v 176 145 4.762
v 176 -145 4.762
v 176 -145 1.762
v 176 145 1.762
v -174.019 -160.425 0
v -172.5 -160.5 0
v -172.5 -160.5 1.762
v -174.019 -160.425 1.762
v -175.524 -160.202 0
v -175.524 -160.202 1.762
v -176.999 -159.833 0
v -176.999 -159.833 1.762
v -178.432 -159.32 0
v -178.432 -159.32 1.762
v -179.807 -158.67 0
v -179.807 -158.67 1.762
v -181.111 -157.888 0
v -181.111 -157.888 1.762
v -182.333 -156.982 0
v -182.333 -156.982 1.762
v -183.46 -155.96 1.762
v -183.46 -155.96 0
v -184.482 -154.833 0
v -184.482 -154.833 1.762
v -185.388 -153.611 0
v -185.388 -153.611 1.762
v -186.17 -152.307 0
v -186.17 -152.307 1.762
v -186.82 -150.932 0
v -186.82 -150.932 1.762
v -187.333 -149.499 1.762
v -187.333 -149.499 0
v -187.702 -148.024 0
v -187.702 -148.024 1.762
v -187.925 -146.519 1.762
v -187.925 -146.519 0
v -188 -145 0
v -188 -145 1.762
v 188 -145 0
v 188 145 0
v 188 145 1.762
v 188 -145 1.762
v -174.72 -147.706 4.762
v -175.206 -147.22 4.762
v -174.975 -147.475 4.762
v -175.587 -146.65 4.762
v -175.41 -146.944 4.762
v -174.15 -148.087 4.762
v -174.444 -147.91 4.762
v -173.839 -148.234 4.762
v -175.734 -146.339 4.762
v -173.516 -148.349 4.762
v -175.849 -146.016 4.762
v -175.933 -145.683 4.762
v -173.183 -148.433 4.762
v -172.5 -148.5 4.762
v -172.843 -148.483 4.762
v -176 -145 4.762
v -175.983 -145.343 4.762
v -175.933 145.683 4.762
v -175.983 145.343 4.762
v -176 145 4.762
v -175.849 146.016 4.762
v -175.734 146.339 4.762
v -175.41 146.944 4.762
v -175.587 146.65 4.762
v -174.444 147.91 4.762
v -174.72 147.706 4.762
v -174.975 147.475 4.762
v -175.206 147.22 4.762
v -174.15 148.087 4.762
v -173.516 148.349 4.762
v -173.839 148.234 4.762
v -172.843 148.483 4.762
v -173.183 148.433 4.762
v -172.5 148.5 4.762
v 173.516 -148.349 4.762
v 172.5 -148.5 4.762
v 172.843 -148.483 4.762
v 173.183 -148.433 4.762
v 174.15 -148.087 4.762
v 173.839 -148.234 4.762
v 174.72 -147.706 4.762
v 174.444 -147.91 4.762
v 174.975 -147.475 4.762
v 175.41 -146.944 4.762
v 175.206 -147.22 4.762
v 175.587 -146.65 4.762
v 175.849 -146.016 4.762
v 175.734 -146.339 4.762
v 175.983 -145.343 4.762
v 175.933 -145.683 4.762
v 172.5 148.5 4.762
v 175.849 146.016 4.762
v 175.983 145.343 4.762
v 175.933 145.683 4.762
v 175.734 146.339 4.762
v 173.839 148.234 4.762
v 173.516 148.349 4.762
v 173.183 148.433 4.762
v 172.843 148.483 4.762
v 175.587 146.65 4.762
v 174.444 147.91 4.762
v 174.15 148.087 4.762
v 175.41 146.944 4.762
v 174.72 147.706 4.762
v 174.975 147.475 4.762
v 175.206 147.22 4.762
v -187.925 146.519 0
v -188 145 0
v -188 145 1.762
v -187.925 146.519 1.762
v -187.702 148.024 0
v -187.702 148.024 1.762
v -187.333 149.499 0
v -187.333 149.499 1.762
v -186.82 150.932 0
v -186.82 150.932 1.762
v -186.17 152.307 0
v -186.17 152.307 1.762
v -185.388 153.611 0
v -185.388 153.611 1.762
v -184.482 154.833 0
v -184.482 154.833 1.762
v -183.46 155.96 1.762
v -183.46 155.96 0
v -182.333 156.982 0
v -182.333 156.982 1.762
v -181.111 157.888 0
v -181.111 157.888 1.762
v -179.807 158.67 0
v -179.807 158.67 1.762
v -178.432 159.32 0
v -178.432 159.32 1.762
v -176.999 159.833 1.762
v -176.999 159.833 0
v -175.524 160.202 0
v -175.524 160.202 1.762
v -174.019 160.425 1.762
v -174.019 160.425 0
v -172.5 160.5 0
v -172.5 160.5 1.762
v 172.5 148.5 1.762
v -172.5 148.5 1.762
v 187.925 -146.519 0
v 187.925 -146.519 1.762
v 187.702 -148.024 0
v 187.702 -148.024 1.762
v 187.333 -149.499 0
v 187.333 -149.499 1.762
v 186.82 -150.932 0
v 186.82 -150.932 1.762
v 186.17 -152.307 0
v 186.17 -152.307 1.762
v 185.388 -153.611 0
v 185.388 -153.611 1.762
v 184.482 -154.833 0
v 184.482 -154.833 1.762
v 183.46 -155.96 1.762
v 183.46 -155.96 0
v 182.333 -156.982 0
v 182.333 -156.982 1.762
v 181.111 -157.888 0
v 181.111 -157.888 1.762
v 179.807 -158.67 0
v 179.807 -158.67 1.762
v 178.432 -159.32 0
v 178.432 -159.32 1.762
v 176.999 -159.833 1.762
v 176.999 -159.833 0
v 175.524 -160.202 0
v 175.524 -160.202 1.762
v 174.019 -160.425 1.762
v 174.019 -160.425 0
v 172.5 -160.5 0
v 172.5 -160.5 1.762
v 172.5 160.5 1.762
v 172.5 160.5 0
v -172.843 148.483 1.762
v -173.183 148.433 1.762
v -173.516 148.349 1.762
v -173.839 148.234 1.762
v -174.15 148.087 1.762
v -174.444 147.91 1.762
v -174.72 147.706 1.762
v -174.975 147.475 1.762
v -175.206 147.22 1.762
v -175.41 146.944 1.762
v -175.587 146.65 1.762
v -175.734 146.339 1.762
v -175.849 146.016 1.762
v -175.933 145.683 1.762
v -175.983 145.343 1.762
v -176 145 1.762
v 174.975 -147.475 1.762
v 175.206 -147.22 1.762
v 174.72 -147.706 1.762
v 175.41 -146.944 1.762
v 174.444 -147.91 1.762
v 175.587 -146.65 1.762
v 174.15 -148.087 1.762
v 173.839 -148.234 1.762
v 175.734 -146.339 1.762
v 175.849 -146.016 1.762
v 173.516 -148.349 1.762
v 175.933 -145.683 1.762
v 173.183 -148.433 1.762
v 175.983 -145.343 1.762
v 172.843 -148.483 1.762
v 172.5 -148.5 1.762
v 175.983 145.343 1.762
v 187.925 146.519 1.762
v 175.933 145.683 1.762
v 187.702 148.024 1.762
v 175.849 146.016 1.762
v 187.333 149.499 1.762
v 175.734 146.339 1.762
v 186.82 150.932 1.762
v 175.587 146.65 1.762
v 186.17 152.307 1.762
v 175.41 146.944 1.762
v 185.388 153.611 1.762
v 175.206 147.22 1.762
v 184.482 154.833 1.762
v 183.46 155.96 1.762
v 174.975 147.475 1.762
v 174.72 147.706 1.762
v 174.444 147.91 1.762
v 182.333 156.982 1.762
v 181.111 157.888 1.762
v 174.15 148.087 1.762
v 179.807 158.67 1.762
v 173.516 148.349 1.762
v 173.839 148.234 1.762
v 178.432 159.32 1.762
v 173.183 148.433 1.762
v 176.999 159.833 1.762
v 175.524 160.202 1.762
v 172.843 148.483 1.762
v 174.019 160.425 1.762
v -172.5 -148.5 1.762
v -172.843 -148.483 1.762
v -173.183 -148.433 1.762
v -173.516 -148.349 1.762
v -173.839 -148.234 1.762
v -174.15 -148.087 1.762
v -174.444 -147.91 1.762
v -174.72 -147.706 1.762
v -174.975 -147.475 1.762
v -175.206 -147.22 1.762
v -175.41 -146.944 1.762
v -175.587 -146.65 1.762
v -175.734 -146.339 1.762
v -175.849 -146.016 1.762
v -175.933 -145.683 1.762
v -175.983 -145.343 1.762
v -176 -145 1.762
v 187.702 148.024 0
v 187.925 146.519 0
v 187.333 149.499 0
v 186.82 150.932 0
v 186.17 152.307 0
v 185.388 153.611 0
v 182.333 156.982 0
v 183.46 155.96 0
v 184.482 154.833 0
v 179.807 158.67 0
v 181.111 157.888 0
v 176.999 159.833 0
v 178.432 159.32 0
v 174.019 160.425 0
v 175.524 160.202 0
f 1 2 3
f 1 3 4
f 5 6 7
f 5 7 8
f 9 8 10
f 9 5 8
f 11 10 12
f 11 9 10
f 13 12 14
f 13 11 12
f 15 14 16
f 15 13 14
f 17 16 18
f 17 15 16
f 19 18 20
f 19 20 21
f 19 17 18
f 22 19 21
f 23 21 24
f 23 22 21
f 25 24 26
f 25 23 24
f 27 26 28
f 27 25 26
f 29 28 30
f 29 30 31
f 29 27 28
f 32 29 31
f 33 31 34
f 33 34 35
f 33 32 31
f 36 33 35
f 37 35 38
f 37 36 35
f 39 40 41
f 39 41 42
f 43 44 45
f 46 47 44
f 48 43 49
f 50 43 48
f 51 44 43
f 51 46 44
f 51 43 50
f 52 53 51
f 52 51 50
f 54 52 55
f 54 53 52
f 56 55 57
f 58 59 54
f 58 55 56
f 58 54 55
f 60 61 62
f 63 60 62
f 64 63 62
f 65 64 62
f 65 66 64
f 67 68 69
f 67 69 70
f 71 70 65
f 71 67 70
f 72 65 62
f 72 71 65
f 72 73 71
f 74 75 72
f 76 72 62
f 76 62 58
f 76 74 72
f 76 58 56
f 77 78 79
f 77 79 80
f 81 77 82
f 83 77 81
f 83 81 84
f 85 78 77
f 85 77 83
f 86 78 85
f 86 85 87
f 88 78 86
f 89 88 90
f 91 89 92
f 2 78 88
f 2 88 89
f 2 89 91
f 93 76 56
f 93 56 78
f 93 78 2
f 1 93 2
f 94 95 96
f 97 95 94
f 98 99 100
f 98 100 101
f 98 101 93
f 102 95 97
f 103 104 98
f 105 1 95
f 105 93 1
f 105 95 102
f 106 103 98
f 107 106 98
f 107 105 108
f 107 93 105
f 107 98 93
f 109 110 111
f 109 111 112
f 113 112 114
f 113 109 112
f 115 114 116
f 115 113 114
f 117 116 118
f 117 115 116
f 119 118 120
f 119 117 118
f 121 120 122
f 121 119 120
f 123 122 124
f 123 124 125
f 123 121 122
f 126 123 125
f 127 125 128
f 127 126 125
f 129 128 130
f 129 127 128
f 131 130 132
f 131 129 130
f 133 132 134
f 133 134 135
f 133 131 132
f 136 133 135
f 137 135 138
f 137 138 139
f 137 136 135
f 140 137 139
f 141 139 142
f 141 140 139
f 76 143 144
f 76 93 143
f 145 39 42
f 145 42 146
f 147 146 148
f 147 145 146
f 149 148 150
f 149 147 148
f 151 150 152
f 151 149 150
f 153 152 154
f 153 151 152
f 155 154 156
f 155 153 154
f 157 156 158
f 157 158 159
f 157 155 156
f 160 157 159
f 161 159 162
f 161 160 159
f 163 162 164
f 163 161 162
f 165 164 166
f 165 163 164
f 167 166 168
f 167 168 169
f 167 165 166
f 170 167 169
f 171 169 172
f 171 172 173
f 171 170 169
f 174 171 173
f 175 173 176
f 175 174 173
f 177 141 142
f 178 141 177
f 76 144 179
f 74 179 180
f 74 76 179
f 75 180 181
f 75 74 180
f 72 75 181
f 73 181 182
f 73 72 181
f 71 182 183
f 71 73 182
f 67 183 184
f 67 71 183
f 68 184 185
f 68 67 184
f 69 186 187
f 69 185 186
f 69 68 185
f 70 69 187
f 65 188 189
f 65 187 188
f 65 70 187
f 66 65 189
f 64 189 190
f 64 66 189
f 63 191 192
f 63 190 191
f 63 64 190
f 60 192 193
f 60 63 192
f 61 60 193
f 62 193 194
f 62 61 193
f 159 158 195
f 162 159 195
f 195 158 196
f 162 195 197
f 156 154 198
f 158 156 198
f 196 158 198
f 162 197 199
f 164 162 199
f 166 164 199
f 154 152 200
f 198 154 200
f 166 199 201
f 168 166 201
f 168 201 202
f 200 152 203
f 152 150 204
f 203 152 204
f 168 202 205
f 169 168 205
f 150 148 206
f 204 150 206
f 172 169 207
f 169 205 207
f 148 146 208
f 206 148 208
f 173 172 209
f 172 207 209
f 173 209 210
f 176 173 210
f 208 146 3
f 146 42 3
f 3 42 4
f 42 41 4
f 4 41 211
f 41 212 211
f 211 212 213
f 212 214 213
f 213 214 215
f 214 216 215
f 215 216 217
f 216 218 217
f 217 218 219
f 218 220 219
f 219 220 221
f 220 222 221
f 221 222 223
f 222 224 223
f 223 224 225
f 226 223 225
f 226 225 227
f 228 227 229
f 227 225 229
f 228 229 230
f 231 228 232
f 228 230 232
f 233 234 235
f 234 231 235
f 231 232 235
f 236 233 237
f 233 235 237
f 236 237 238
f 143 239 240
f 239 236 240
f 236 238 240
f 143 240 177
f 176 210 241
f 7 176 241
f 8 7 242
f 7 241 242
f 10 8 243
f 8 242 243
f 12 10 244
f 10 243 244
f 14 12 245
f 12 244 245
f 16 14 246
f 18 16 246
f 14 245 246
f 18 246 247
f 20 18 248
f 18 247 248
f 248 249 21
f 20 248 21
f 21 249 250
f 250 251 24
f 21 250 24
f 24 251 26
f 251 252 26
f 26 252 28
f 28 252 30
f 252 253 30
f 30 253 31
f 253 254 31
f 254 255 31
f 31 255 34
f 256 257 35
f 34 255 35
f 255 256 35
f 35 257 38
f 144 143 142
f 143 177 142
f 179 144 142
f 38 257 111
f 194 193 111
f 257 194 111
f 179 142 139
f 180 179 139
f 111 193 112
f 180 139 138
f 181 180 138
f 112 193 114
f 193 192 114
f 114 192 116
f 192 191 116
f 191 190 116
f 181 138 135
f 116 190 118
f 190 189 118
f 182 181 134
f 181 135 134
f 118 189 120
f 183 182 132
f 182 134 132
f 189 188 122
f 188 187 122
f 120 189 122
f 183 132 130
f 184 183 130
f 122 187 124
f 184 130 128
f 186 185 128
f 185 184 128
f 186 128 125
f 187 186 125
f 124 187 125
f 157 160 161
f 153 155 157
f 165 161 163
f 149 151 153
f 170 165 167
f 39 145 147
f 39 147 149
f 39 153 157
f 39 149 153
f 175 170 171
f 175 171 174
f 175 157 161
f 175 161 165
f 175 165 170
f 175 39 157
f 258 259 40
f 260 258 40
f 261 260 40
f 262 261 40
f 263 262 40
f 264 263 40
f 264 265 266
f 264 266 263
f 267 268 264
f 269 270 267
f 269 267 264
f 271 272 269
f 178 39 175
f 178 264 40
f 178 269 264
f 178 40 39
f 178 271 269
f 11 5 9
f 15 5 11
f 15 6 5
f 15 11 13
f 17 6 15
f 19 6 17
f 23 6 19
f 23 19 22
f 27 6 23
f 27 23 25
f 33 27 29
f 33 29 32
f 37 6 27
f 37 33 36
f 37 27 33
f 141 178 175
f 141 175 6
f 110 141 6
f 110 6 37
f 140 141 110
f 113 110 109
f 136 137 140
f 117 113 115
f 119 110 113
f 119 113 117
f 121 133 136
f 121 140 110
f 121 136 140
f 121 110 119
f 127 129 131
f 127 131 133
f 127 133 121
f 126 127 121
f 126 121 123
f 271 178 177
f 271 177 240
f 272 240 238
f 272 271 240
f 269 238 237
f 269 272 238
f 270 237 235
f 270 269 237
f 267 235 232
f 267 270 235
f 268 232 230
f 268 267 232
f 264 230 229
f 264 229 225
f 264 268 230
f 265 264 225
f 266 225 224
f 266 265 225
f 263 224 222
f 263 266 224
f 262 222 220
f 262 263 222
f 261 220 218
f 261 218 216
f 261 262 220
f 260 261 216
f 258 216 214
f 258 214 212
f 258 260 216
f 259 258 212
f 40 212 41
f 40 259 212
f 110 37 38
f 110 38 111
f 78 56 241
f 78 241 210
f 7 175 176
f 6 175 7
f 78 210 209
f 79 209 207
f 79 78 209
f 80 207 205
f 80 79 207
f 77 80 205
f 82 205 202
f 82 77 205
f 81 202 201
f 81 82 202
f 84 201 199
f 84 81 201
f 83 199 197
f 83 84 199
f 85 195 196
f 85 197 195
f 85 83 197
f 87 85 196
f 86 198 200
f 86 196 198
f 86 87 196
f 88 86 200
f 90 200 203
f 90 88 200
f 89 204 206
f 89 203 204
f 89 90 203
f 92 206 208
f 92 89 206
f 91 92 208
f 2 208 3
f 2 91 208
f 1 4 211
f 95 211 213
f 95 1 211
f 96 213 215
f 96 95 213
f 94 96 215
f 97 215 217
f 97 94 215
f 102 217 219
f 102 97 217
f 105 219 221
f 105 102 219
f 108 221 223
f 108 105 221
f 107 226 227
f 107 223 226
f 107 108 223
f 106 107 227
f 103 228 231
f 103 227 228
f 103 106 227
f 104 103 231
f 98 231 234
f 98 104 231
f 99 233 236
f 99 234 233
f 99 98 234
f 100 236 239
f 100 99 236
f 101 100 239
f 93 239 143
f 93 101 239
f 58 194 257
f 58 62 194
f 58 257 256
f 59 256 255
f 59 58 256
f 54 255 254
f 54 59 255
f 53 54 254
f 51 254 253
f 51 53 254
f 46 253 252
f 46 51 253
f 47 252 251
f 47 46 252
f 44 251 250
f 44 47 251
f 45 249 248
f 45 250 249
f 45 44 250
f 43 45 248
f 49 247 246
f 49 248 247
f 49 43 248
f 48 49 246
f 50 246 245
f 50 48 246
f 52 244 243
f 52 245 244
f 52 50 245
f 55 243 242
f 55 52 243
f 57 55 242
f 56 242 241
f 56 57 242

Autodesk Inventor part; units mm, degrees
ref_plane "YZ Plane" through (0, 0, 0) normal (1, 0, 0) x (0, 1, 0)
ref_plane "XZ Plane" through (0, 0, 0) normal (0, 1, 0) x (-1, 0, 0)
sketch "Sketch1" plane through (0, 0, 0) normal (0, 0, 1) x (1, 0, 0)
  line L0 (176.5, -149) -> (-176.5, -149)
  line L1 (-176.5, -149) -> (-176.5, 149)
  line L2 (-176.5, 149) -> (176.5, 149)
  line L3 (176.5, 149) -> (176.5, -149)
  line L4 (176.5, -149) -> (-176.5, 149) construction
  line L5 (-176.5, -149) -> (176.5, 149) construction
  point P0 (0, 0)
  dimension "d0" = 353
  dimension "d1" = 298
extrude "Extrusion1" add sketch "Sketch1" along normal blind 4.7625
fillet "Fillet1" radius 4 4 edges at (-176.5, -149, 2.3813) (176.5, -149, 2.3813) (176.5, 149, 2.3813) (-176.5, 149, 2.3813)
sketch "Sketch2" plane through (0, 0, 4.7625) normal (0, 0, 1) x (1, 0, 0)
  arc A0 (-172.5, 149) -> (-176.5, 145) centre (-172.5, 145) ccw projected
  line L0 (-176.5, 145) -> (-176.5, -145) projected
  arc A1 (-176.5, -145) -> (-172.5, -149) centre (-172.5, -145) ccw projected
  line L1 (-172.5, -149) -> (172.5, -149) projected
  arc A2 (172.5, -149) -> (176.5, -145) centre (172.5, -145) ccw projected
  line L2 (176.5, -145) -> (176.5, 145) projected
  arc A3 (176.5, 145) -> (172.5, 149) centre (172.5, 145) ccw projected
  line L3 (172.5, 149) -> (-172.5, 149) projected
  arc A4 (-172.5, 148.5) -> (-176, 145) centre (-172.5, 145) ccw
  line L4 (-176, 145) -> (-176, -145)
  arc A5 (-176, -145) -> (-172.5, -148.5) centre (-172.5, -145) ccw
  line L5 (-172.5, -148.5) -> (172.5, -148.5)
  arc A6 (172.5, -148.5) -> (176, -145) centre (172.5, -145) ccw
  line L6 (176, -145) -> (176, 145)
  arc A7 (176, 145) -> (172.5, 148.5) centre (172.5, 145) ccw
  line L7 (172.5, 148.5) -> (-172.5, 148.5)
  point P0 (0, 0)
  dimension "d5" = 0.5
extrude "Extrusion2" cut sketch "Sketch2" against normal through all
sketch "Sketch3" plane through (0, 0, 0) normal (0, 0, -1) x (-1, 0, 0)
  arc A0 (-172.5, 148.5) -> (-176, 145) centre (-172.5, 145) ccw projected
  line L0 (-176, 145) -> (-176, -145) projected
  arc A1 (-176, -145) -> (-172.5, -148.5) centre (-172.5, -145) ccw projected
  line L1 (-172.5, -148.5) -> (172.5, -148.5) projected
  arc A2 (172.5, -148.5) -> (176, -145) centre (172.5, -145) ccw projected
  line L2 (176, -145) -> (176, 145) projected
  arc A3 (176, 145) -> (172.5, 148.5) centre (172.5, 145) ccw projected
  line L3 (172.5, 148.5) -> (-172.5, 148.5) projected
  arc A4 (-172.5, 160.5) -> (-188, 145) centre (-172.5, 145) ccw
  line L4 (-188, 145) -> (-188, -145)
  arc A5 (-188, -145) -> (-172.5, -160.5) centre (-172.5, -145) ccw
  line L5 (-172.5, -160.5) -> (172.5, -160.5)
  arc A6 (172.5, -160.5) -> (188, -145) centre (172.5, -145) ccw
  line L6 (188, -145) -> (188, 145)
  arc A7 (188, 145) -> (172.5, 160.5) centre (172.5, 145) ccw
  line L7 (172.5, 160.5) -> (-172.5, 160.5)
  point P0 (0, 0)
  dimension "d8" = 12
ref_plane "Work Plane1" through (0, 0, 1.7625) normal (0, 0, 1) x (1, 0, 0)
extrude "Extrusion3" add sketch "Sketch3" against normal up to surface (1.7625 mm away)
properties part number "Door Window" material "Polycarbonate, Smoke"
